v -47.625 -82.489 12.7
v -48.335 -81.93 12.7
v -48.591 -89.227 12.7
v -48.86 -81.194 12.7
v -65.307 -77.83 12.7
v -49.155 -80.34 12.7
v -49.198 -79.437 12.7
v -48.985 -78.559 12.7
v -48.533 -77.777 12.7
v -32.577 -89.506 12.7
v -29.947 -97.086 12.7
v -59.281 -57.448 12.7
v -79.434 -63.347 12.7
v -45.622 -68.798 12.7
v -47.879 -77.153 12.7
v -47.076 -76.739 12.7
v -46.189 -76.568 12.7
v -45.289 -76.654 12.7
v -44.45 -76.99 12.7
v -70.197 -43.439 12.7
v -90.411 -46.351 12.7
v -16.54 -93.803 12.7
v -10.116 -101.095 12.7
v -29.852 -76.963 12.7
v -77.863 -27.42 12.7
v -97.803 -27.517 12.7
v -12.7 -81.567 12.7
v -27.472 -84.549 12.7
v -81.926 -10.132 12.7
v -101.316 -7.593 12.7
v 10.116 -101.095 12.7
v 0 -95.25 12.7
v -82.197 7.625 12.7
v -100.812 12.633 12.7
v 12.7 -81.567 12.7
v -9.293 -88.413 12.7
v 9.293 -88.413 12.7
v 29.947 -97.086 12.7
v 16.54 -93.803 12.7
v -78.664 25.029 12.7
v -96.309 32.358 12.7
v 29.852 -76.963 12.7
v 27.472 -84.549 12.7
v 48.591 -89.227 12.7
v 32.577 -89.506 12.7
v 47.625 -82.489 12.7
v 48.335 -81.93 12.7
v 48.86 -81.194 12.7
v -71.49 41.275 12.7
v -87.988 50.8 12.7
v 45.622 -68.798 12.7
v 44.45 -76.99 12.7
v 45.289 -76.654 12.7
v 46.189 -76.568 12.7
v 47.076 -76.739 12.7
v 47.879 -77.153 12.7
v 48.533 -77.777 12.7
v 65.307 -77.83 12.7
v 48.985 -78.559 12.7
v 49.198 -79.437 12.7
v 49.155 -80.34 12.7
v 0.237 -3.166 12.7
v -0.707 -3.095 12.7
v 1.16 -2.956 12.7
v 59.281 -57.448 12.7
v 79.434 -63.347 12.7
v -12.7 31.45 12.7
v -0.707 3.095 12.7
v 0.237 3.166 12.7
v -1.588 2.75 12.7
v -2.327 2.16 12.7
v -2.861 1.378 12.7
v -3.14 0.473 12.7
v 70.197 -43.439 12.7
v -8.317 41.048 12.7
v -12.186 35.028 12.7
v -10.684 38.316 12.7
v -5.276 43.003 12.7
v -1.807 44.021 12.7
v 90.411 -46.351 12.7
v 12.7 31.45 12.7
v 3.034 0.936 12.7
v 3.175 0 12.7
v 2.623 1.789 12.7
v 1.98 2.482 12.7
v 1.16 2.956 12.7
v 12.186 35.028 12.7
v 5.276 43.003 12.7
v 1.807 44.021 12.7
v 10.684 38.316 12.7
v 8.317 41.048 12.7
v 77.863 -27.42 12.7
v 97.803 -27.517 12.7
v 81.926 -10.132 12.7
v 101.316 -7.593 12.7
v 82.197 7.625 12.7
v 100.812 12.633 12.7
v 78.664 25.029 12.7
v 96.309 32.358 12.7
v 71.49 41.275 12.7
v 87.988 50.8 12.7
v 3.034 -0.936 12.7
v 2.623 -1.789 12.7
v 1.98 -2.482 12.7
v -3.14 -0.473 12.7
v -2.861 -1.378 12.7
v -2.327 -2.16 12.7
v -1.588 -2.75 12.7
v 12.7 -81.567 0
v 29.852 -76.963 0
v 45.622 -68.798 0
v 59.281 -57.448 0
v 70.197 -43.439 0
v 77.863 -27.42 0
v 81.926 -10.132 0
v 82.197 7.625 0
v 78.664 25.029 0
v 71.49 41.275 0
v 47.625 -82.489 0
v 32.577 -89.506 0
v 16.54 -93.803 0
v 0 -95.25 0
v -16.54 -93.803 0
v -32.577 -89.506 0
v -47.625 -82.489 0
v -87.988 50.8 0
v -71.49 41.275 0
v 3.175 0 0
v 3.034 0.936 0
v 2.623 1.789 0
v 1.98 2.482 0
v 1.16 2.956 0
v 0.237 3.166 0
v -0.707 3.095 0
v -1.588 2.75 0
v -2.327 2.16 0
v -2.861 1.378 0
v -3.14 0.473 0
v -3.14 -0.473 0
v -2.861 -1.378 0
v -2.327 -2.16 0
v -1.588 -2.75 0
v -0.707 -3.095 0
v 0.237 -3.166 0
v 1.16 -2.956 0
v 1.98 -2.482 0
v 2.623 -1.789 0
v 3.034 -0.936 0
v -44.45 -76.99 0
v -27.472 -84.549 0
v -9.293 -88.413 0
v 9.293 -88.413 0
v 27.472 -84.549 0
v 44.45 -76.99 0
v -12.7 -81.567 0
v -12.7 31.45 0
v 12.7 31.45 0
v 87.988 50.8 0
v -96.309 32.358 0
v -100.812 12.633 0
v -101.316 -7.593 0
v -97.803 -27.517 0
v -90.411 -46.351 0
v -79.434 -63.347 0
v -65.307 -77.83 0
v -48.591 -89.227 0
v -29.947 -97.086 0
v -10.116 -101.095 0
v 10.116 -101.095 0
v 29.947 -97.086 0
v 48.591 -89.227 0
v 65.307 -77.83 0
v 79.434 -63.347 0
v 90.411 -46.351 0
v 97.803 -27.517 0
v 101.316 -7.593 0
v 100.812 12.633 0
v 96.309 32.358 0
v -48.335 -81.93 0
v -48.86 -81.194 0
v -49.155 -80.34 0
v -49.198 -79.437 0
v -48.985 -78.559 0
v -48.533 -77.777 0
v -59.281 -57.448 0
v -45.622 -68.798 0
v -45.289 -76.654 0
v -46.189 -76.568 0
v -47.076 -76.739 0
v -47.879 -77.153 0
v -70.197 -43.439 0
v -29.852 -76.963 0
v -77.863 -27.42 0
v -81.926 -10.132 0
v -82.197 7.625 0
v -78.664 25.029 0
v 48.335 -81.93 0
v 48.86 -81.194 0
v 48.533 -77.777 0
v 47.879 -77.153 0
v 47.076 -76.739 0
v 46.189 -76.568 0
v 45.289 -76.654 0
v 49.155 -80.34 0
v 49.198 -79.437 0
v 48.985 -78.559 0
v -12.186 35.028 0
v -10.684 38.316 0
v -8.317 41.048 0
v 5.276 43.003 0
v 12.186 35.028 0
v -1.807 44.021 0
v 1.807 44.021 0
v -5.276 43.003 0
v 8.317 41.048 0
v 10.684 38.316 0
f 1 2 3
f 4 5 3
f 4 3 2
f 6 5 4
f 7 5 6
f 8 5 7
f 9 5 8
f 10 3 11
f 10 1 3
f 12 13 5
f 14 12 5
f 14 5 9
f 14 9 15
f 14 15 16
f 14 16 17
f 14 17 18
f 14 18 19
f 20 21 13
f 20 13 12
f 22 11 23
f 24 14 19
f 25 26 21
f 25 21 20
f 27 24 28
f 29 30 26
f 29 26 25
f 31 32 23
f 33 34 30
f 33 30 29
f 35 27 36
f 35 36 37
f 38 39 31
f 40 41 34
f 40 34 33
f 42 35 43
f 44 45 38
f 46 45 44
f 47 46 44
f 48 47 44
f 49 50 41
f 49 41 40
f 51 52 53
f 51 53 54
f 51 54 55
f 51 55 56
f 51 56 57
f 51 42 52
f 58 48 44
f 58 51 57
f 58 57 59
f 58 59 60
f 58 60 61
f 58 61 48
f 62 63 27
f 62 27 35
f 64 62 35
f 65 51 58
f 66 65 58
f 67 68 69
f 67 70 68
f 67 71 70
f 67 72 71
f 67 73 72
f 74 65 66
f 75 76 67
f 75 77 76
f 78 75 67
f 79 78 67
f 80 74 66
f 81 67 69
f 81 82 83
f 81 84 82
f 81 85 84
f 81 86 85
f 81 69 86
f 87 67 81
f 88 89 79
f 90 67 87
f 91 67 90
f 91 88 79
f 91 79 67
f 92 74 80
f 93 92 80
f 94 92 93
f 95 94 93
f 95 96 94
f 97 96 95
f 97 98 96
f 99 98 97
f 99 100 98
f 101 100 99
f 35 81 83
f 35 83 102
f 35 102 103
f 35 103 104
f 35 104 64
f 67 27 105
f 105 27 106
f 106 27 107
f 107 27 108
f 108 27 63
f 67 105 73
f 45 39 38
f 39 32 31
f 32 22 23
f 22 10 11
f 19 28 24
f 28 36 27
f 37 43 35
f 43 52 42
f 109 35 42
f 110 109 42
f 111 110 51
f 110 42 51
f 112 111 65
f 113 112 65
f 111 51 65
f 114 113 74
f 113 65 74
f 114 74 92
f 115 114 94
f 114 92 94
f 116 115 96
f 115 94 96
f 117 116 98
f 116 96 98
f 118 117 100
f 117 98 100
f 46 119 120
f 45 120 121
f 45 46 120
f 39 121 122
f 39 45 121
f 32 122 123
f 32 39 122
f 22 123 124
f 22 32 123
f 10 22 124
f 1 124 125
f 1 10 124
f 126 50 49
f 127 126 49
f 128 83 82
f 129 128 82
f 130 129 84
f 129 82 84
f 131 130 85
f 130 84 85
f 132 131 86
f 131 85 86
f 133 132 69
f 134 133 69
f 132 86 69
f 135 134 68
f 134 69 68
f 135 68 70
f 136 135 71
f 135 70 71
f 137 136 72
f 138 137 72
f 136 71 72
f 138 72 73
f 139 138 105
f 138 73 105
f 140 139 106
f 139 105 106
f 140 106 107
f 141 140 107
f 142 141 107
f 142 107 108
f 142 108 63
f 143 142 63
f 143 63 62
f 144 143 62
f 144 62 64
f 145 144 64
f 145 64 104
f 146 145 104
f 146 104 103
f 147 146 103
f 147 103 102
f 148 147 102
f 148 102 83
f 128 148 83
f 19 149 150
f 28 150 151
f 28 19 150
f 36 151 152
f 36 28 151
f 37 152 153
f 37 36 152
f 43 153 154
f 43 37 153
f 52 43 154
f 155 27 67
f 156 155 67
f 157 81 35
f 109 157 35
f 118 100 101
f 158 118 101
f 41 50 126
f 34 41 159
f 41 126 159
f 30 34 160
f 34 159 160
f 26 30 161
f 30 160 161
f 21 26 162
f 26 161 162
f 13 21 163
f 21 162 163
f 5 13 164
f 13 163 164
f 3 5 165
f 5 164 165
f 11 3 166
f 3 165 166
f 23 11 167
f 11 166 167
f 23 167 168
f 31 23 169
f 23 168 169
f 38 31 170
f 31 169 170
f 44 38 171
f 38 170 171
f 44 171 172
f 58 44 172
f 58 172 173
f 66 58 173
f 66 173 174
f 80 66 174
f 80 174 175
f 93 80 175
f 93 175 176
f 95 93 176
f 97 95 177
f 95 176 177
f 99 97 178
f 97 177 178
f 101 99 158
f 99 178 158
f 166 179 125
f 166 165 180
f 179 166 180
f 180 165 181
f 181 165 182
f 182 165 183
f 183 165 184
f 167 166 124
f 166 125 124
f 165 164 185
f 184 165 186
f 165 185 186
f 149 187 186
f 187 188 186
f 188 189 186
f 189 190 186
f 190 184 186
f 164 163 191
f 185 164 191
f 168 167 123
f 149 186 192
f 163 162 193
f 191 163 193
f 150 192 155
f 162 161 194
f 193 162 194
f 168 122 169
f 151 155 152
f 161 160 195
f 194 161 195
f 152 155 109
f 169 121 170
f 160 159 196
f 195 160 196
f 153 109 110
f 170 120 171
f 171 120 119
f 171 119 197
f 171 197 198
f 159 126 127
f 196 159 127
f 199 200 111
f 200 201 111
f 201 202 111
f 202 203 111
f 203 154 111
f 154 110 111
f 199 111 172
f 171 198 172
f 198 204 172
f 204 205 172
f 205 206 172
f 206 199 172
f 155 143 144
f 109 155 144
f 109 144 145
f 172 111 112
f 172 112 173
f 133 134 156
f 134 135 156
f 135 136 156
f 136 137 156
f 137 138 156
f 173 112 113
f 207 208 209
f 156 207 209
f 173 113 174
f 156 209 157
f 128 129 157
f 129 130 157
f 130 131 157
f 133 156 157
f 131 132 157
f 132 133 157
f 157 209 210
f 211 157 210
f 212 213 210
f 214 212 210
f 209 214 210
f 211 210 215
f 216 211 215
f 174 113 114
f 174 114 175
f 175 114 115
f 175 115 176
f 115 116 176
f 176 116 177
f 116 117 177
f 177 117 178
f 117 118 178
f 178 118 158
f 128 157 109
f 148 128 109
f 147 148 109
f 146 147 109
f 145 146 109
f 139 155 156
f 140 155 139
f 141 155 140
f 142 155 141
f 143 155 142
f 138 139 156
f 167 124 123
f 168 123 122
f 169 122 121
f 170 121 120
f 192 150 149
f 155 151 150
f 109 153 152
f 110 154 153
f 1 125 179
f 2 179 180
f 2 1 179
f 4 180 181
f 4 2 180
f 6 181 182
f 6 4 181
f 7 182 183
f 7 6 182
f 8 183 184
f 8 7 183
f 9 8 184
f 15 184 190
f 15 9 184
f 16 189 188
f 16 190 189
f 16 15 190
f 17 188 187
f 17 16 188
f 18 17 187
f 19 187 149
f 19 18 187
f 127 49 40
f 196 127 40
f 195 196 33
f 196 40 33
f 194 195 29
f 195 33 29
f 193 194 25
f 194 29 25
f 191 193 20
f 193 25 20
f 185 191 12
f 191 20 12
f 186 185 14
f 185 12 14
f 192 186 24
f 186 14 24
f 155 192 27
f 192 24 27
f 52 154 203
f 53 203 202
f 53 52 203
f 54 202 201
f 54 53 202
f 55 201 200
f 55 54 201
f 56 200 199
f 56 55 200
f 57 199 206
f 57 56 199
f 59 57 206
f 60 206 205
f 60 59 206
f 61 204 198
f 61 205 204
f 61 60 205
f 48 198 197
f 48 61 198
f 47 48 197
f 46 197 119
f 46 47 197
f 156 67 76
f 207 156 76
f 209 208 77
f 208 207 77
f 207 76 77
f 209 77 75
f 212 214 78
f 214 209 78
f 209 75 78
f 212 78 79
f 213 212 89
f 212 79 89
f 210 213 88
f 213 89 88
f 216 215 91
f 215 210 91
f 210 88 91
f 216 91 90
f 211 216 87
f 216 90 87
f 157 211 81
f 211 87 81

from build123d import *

# Parameters (mm, degrees)
SKETCH1_R         = 101.6
EXTRUDE1_DEPTH    = 12.7
SKETCH3_R         = 3.175
EXTRUDE3_DEPTH    = 145.244271983
SKETCH4_OUTSIDE_W = 262.73
SKETCH4_OUTSIDE_H = 262.73
EXTRUDE4_DEPTH    = 145.244271983


with BuildPart() as part:
    # Sketch1 → Extrude1 (new body)
    with BuildSketch(Plane.XY):
        Circle(SKETCH1_R)
    extrude(amount=EXTRUDE1_DEPTH)

    # Sketch3 → Extrude3 (cut, through all)
    with BuildSketch(Plane.XY.offset(12.7)):
        Circle(SKETCH3_R)
        with BuildLine():
            ThreePointArc((47.625, -82.48891971), (0, -95.25), (-47.625, -82.48891971))
            ThreePointArc((-47.625, -82.48891971), (-48.787130657, -78.151789053), (-44.45, -76.989658396))
            ThreePointArc((-44.45, -76.989658396), (0, -88.9), (44.45, -76.989658396))
            ThreePointArc((44.45, -76.989658396), (48.787130657, -78.151789053), (47.625, -82.48891971))
        make_face()
    extrude(amount=-EXTRUDE3_DEPTH, mode=Mode.SUBTRACT)

    # Sketch4 outside → Extrude4 (cut, through all)
    with BuildSketch(Plane.XY.offset(12.7)):
        Rectangle(SKETCH4_OUTSIDE_W, SKETCH4_OUTSIDE_H)
        with BuildLine():
            Line((-87.988181024, 50.8), (-71.490397082, 41.275))
            ThreePointArc((-71.490397082, 41.275), (-74.46179501, -35.636267817), (-12.7, -81.567226875))
            Line((-12.7, -81.567226875), (-12.7, 31.450356454))
            ThreePointArc((-12.7, 31.450356454), (0, 44.150356454), (12.7, 31.450356454))
            Line((12.7, 31.450356454), (12.7, -81.567226875))
            ThreePointArc((12.7, -81.567226875), (74.46179501, -35.636267817), (71.490397082, 41.275))
            Line((71.490397082, 41.275), (87.988181024, 50.8))
            ThreePointArc((87.988181024, 50.8), (0, -101.6), (-87.988181024, 50.8))
        make_face(mode=Mode.SUBTRACT)
    extrude(amount=-EXTRUDE4_DEPTH, mode=Mode.SUBTRACT)


solid = part.part
